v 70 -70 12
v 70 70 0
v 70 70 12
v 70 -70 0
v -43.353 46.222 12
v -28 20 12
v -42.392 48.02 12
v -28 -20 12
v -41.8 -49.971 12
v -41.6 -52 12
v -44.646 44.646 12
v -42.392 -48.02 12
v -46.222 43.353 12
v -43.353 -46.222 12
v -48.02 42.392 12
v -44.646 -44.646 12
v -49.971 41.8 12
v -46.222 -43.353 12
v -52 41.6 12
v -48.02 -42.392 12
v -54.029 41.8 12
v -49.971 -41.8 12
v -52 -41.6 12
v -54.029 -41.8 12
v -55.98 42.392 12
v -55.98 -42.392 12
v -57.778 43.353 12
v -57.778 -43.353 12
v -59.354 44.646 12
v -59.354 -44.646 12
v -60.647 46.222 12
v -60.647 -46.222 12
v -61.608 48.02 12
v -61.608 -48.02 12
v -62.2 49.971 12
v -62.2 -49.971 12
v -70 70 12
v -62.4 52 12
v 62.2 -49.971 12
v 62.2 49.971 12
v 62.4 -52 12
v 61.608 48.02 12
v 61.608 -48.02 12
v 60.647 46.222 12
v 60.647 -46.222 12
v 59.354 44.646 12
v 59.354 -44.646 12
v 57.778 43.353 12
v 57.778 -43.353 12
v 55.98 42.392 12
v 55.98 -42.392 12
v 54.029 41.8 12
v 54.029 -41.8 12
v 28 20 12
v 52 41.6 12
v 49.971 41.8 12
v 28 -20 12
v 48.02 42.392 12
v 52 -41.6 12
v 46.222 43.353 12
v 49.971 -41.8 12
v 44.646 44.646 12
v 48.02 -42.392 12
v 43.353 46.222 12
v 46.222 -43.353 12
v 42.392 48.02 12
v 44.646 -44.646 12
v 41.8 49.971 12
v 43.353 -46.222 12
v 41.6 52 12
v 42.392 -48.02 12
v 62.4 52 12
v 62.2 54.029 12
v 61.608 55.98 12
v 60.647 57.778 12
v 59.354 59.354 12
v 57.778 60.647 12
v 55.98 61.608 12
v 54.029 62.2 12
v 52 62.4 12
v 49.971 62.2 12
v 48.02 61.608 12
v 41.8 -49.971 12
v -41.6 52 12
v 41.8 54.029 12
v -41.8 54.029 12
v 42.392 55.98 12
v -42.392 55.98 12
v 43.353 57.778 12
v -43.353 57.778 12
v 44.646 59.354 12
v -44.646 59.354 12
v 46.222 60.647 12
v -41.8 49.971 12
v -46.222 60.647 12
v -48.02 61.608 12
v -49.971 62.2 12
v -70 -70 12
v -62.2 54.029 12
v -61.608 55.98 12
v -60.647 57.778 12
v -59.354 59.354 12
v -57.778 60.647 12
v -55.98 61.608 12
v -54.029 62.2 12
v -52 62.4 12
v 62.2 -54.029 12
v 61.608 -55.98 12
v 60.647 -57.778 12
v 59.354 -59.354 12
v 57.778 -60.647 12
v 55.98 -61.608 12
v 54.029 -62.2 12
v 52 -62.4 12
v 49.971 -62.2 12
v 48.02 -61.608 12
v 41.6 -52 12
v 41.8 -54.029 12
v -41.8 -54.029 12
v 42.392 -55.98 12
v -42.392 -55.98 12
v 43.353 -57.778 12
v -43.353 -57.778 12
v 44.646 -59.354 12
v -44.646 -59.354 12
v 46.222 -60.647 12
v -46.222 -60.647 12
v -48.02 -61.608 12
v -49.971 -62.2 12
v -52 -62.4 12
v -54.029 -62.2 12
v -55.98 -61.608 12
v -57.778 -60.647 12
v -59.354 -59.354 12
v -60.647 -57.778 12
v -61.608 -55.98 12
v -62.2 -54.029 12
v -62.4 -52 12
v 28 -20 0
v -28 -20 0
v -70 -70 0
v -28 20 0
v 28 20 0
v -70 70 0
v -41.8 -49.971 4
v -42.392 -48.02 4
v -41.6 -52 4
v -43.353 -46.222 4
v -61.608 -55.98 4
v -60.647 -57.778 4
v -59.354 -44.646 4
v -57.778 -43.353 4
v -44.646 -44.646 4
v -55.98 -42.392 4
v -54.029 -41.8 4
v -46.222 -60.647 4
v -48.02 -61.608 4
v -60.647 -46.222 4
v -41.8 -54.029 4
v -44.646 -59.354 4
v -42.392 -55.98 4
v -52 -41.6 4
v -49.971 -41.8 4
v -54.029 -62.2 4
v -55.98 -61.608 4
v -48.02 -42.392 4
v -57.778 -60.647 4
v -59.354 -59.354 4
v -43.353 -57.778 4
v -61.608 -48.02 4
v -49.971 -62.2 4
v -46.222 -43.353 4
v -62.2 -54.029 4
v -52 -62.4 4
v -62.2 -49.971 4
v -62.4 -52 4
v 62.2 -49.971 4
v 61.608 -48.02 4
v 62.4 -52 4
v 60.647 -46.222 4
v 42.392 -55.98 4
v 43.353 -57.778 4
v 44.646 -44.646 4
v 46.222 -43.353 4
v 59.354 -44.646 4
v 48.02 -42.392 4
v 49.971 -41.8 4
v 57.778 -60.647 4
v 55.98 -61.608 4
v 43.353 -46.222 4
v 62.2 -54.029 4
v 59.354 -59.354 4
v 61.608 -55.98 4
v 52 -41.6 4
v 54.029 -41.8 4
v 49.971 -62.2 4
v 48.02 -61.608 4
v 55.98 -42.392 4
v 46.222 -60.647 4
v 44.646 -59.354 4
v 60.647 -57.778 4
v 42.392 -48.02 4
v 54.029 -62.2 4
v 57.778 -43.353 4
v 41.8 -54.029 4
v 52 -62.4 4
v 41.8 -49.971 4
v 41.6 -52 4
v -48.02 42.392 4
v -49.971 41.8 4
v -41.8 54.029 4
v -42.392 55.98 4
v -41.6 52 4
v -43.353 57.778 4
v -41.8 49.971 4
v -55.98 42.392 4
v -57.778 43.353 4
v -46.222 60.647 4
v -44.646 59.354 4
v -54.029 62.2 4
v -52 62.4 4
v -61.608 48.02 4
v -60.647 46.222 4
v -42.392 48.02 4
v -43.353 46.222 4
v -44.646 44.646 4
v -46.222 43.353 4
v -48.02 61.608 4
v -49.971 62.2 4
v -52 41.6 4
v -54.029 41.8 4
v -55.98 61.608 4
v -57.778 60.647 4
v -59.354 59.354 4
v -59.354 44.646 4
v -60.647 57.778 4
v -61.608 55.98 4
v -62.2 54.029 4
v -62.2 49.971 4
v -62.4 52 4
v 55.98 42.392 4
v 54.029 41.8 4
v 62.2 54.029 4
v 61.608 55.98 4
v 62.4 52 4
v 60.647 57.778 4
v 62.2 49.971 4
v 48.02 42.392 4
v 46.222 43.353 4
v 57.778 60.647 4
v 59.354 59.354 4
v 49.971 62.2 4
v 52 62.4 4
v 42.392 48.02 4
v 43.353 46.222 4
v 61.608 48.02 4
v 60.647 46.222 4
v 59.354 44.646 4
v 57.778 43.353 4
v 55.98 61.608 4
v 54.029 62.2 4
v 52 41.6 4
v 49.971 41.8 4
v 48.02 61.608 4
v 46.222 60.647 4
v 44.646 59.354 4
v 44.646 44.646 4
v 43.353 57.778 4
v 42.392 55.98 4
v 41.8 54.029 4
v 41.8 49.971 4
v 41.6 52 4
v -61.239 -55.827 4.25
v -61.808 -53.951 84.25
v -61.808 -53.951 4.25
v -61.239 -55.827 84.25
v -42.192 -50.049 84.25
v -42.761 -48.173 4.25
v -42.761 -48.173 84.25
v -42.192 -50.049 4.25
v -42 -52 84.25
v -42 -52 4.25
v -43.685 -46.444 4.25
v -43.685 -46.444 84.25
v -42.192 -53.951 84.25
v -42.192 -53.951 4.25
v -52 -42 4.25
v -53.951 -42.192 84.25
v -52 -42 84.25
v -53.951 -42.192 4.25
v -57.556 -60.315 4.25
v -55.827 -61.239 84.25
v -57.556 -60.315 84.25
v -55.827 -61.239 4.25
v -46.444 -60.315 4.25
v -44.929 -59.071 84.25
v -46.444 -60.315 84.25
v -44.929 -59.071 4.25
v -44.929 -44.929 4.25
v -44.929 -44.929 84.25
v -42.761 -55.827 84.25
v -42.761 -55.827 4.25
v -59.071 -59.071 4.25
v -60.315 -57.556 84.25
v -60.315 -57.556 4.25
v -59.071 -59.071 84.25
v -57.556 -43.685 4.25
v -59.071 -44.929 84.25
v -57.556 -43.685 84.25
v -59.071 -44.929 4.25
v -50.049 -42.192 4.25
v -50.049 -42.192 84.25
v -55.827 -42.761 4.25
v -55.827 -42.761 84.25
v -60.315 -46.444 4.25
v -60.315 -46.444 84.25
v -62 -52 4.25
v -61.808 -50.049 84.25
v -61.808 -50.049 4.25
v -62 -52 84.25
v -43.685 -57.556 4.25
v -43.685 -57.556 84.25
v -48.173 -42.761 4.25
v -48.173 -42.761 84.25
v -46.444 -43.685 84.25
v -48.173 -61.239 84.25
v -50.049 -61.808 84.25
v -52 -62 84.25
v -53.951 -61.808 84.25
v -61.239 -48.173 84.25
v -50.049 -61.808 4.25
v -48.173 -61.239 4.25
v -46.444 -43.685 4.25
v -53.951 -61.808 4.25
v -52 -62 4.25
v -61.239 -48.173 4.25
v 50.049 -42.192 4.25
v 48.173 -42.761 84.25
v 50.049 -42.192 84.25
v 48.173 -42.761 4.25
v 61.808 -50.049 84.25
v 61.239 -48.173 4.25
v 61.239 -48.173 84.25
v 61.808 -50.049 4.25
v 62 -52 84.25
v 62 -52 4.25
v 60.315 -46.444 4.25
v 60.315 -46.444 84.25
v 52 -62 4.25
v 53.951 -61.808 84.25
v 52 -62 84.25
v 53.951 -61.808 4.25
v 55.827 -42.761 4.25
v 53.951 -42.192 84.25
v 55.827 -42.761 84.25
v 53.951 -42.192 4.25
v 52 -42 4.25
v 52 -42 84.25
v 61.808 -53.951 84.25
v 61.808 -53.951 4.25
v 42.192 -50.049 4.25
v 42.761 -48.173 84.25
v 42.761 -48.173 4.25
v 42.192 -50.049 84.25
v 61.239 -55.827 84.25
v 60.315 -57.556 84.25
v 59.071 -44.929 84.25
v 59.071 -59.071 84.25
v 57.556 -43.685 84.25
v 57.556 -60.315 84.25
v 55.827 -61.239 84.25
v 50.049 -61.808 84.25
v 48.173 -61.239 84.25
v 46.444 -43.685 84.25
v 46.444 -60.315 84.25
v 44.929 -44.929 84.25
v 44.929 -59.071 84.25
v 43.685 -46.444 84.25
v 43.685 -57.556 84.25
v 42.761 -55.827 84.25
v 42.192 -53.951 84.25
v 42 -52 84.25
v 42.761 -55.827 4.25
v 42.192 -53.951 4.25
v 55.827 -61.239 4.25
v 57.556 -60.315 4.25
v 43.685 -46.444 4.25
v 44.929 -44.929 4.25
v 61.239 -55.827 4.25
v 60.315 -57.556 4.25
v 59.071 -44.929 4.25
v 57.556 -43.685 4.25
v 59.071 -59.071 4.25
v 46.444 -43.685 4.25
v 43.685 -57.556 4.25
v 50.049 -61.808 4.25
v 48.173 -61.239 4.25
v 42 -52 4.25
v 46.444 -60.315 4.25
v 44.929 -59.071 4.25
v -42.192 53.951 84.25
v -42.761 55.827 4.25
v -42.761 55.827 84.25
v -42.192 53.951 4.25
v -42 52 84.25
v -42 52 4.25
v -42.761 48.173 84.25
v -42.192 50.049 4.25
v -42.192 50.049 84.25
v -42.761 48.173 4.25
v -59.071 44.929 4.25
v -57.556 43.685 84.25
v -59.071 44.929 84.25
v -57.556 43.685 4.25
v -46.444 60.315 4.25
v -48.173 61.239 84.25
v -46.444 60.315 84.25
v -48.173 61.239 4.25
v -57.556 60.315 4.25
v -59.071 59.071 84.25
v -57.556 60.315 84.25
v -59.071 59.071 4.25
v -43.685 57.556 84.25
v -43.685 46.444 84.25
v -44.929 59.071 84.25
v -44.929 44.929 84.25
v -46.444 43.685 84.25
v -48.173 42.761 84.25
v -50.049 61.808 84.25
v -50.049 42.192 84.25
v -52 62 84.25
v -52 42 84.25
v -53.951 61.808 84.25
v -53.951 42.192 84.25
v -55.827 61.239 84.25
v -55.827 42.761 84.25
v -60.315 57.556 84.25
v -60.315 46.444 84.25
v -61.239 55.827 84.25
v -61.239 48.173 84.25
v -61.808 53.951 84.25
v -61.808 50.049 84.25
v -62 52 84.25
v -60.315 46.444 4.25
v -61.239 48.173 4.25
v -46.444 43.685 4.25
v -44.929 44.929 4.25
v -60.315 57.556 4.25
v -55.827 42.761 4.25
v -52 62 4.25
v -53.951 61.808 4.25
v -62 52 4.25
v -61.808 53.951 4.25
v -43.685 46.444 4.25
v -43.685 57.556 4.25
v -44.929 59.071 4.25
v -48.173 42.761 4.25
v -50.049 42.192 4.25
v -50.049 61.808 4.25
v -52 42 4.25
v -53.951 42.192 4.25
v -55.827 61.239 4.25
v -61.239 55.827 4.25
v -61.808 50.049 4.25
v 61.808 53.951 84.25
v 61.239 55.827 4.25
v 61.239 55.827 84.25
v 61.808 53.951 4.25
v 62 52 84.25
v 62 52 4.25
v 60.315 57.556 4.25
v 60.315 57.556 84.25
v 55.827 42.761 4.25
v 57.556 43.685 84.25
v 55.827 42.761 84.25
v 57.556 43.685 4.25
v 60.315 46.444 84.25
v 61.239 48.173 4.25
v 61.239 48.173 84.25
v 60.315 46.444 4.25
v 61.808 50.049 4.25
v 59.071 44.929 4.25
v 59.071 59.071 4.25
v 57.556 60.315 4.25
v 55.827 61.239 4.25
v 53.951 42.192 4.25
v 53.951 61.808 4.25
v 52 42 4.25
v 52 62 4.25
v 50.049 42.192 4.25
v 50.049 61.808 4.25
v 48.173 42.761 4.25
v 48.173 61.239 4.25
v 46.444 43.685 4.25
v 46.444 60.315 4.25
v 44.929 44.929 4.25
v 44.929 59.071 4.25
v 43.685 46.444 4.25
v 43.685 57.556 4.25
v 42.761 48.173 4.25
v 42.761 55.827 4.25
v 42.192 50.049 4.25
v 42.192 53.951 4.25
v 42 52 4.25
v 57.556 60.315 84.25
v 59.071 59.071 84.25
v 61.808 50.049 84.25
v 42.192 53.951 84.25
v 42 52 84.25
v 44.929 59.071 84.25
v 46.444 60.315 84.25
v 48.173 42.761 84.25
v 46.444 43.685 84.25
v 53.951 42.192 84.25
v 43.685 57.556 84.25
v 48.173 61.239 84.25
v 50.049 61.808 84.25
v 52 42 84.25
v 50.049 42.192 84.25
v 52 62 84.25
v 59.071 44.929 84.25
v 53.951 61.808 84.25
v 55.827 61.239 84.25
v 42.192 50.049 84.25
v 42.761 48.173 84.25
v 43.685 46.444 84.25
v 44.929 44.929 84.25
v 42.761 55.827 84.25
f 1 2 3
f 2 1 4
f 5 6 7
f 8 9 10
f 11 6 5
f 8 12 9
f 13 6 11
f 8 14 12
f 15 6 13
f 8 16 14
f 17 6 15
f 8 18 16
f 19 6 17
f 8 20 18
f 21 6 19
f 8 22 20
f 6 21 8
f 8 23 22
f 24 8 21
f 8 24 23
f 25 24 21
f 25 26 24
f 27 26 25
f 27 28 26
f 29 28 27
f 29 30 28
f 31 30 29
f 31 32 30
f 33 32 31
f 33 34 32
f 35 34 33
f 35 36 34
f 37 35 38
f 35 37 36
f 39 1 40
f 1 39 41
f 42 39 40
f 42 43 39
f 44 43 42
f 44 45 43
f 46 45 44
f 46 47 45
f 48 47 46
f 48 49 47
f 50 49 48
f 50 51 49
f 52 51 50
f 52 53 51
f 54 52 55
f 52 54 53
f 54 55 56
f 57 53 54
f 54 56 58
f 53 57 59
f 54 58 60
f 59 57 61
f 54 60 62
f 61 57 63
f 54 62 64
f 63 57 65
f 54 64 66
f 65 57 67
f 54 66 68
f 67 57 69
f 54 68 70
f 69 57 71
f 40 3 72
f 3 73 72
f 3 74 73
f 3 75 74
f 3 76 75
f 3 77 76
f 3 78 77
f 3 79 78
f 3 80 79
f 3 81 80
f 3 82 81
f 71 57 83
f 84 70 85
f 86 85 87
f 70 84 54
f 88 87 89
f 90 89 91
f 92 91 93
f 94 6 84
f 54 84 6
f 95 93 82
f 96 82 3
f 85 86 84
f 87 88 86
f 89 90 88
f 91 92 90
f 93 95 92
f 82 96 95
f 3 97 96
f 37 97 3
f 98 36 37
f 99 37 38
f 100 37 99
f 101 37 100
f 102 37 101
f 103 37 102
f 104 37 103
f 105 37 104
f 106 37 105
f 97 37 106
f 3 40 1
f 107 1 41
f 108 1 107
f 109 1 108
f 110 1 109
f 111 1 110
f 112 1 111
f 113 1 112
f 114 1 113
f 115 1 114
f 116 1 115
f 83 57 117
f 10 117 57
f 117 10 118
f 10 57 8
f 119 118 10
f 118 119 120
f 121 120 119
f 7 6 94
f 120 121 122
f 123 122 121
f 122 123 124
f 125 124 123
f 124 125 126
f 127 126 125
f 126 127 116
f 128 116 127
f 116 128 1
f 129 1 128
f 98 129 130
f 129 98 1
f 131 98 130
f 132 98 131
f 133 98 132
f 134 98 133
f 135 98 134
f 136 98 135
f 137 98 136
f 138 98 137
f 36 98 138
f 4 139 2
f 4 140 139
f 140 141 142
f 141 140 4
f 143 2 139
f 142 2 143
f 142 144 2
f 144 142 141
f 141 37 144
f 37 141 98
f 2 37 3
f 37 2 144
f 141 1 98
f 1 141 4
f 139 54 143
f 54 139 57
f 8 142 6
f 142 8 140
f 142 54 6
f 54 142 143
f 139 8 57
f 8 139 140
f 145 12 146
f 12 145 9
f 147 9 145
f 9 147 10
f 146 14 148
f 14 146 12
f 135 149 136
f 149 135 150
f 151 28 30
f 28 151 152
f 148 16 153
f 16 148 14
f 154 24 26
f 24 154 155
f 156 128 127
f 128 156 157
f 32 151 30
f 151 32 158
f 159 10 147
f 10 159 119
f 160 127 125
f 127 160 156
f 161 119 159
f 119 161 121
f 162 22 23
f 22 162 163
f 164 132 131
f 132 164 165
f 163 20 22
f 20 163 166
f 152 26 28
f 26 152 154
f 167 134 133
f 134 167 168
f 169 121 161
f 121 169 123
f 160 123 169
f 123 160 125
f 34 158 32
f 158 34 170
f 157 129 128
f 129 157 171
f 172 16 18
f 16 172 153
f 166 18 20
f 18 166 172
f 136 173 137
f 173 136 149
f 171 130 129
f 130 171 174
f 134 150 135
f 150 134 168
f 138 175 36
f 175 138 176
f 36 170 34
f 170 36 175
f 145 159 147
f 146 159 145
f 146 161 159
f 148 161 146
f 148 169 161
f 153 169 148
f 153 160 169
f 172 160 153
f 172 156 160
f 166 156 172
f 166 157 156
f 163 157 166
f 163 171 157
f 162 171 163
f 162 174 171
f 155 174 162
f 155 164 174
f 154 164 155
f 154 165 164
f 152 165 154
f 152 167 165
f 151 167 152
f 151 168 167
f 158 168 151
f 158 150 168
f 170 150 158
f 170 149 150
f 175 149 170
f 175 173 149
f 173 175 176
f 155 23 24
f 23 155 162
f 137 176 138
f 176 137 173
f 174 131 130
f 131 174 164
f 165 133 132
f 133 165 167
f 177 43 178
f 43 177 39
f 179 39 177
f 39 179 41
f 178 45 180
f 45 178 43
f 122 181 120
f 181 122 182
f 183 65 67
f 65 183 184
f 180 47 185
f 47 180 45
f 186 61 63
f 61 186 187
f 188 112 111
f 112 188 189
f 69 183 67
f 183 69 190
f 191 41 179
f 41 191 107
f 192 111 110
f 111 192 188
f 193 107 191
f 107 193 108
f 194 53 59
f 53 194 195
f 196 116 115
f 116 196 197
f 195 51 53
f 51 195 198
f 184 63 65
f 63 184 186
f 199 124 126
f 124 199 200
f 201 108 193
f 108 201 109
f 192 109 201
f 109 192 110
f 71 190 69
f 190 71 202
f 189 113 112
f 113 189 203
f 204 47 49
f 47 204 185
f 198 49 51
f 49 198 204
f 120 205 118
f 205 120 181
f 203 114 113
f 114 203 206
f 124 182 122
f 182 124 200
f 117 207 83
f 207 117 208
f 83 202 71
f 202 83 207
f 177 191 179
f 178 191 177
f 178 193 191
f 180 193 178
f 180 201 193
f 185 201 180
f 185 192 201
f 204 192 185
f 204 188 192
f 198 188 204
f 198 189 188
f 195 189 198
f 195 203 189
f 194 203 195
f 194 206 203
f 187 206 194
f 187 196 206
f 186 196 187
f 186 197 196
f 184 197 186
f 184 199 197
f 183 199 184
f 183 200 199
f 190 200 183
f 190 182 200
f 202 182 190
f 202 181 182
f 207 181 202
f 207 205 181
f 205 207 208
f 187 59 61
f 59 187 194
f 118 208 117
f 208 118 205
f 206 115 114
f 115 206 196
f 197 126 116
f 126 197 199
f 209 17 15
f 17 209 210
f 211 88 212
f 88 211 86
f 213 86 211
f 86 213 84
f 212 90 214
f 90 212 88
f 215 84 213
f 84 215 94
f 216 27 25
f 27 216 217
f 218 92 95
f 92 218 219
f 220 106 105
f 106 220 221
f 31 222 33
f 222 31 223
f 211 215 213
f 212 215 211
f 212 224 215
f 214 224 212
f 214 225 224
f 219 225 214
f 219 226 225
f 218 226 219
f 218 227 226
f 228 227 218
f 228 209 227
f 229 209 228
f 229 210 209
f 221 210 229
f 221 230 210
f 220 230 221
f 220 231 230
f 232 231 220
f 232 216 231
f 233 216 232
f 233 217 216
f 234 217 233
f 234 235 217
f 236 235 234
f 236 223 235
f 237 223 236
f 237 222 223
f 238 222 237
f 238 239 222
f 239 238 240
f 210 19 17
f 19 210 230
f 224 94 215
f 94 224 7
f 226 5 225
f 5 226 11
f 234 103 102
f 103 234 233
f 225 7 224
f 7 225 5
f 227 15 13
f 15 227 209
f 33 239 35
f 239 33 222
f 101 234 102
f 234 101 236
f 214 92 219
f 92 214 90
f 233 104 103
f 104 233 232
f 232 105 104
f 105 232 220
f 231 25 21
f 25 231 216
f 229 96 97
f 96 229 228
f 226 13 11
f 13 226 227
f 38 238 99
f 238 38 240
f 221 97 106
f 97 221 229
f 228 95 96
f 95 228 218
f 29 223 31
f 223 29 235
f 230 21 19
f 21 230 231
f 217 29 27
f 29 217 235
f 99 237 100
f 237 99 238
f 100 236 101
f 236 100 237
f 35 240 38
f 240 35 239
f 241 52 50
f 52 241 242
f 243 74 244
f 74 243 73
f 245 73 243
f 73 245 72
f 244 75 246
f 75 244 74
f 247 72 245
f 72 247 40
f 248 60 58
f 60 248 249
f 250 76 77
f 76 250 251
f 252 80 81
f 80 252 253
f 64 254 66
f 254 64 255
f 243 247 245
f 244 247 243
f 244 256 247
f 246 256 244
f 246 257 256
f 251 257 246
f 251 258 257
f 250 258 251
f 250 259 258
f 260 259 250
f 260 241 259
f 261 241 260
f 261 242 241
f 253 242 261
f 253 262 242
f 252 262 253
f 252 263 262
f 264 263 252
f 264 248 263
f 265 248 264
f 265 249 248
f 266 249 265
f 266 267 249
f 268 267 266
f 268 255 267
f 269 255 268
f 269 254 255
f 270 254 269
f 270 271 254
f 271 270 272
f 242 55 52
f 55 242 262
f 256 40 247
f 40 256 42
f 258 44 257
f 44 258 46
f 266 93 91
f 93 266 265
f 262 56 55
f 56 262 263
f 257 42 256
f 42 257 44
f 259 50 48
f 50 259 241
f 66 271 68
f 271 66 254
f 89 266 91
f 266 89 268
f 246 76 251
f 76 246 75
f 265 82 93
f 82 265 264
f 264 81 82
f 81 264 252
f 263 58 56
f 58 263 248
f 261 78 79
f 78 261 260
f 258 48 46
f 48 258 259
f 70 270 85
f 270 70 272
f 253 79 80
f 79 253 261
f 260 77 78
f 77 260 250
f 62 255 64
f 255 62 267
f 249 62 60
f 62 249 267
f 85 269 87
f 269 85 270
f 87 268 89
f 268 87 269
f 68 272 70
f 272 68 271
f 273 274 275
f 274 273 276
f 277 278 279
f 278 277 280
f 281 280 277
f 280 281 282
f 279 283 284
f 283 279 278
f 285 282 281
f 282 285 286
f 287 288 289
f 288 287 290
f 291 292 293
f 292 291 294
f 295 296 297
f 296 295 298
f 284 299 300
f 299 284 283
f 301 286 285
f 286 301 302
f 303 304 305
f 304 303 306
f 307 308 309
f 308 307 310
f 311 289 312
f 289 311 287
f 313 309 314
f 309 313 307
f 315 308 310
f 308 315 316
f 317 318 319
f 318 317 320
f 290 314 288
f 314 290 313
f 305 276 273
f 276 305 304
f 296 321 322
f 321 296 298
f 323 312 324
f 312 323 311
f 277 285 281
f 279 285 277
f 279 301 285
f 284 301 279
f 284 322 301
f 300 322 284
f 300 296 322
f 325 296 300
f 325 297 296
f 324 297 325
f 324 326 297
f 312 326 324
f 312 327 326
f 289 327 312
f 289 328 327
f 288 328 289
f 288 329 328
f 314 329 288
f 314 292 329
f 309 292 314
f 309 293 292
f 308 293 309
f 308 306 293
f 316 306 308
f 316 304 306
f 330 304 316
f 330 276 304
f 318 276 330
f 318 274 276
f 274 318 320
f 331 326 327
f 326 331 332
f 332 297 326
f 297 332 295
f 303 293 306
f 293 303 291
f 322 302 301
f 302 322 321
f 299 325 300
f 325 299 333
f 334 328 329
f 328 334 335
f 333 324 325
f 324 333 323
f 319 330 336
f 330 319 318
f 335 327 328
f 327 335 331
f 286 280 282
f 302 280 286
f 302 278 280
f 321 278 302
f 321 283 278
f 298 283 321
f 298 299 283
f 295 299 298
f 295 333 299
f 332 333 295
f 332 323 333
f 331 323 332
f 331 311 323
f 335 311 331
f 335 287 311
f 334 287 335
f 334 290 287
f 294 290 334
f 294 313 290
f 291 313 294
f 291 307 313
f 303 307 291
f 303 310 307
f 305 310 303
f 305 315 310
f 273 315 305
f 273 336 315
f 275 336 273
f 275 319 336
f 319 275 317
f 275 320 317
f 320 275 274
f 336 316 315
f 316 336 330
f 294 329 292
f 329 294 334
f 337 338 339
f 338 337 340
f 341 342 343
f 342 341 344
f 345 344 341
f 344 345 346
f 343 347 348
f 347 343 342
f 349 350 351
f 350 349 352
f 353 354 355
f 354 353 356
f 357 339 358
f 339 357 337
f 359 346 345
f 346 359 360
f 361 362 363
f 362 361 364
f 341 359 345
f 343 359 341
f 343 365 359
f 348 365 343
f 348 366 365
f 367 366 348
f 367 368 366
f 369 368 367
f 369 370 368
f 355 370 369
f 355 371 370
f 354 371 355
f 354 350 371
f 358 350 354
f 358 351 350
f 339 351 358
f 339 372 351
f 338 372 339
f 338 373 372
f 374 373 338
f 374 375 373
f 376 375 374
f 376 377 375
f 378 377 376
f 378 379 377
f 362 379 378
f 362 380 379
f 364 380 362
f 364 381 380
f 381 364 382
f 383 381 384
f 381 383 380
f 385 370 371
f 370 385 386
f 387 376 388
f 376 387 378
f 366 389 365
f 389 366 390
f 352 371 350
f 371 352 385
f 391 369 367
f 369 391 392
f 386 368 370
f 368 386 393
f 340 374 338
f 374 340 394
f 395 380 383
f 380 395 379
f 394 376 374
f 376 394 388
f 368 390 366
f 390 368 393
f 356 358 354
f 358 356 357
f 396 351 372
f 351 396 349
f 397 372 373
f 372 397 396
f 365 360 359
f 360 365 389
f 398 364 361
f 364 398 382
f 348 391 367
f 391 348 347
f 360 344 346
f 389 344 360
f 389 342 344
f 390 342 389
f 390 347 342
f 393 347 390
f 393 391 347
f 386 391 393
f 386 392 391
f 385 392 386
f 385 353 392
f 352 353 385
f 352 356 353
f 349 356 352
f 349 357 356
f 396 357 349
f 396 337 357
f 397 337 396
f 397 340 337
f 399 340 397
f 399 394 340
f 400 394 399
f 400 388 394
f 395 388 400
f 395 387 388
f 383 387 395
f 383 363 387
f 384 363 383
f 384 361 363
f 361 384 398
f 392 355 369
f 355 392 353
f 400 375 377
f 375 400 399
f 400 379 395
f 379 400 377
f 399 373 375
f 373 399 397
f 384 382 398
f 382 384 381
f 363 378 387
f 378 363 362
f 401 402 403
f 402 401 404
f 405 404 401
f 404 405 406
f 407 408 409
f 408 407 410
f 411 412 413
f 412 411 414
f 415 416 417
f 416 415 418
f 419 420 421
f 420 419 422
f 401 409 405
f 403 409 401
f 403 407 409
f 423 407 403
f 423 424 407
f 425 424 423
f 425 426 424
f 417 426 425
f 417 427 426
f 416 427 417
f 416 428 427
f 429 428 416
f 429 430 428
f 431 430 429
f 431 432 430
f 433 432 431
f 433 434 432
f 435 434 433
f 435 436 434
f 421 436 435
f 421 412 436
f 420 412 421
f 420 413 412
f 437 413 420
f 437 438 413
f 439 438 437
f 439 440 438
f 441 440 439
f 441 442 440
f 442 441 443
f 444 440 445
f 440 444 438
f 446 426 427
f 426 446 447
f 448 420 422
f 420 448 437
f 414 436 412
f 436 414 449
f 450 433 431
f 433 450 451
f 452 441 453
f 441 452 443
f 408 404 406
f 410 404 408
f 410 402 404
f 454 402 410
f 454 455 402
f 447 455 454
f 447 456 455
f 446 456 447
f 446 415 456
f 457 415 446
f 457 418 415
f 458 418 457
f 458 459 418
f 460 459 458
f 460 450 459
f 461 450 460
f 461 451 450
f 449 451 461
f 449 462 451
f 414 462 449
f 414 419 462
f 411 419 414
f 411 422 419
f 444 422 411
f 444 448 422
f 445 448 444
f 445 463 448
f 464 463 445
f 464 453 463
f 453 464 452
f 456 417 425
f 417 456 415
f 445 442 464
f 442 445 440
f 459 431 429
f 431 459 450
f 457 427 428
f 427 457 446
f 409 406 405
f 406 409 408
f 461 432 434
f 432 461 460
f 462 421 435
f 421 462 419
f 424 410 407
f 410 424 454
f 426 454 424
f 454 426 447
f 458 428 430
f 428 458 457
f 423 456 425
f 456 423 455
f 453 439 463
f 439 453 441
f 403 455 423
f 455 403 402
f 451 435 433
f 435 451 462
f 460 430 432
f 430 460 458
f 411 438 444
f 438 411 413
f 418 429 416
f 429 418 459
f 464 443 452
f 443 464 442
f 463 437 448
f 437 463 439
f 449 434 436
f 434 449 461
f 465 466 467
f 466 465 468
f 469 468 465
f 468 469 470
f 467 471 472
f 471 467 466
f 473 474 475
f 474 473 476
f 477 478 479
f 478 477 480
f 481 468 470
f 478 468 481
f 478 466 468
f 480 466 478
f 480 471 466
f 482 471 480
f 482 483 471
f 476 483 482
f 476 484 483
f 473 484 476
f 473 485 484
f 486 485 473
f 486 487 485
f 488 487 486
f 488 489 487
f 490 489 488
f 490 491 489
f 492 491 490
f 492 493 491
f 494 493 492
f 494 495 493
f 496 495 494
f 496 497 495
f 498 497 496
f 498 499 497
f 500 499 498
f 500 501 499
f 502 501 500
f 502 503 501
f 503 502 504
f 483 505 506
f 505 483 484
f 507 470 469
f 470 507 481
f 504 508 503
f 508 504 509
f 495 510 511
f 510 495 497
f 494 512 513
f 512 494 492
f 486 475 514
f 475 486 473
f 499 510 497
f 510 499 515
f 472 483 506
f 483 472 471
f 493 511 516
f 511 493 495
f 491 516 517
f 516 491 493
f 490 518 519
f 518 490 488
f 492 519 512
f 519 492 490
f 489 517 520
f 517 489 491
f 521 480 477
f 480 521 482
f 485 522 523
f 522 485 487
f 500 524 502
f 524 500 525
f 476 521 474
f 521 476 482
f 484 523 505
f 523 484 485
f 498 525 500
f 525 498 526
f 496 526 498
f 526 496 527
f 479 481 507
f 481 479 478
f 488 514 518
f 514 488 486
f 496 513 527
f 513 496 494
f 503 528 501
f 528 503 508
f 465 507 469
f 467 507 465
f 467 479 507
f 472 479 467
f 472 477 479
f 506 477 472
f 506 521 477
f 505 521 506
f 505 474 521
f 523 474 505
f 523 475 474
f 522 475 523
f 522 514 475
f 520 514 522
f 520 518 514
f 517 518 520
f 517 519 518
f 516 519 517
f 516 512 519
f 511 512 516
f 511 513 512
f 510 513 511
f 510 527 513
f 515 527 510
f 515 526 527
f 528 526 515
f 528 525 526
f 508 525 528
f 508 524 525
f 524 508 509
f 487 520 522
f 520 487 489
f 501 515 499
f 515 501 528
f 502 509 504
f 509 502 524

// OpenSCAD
$fn = 32;

// ------------------------------------------------------------------------
// Frame with four posts: 140 x 140 mm frame, four d20 posts
// Every part is its own module, assembly() places them once.
// ------------------------------------------------------------------------

// --- part 1 ---
module base_frame() {
  difference() {
    translate([-70, -70, 0]) cube([140, 140, 12]);
    translate([-28, -20, -1]) cube([56, 40, 14]);
    translate([-52, -52, 4]) cylinder(h = 9, d = 20.8);
    translate([52, -52, 4]) cylinder(h = 9, d = 20.8);
    translate([-52, 52, 4]) cylinder(h = 9, d = 20.8);
    translate([52, 52, 4]) cylinder(h = 9, d = 20.8);
  }
}

// --- part 2 ---
module post1() {
  cylinder(h = 80, d = 20);
}

// --- part 3 ---
module post2() {
  cylinder(h = 80, d = 20);
}

// --- part 4 ---
module post3() {
  cylinder(h = 80, d = 20);
}

// --- part 5 ---
module post4() {
  cylinder(h = 80, d = 20);
}

// --- assembly ---
module assembly() {
  translate([0, 0, 0]) rotate([0, 0, 0]) base_frame();
  translate([-52, -52, 4.25]) rotate([0, 0, 0]) post1();
  translate([52, -52, 4.25]) rotate([0, 0, 0]) post2();
  translate([-52, 52, 4.25]) rotate([0, 0, 0]) post3();
  translate([52, 52, 4.25]) rotate([0, 0, 0]) post4();
}

assembly();
